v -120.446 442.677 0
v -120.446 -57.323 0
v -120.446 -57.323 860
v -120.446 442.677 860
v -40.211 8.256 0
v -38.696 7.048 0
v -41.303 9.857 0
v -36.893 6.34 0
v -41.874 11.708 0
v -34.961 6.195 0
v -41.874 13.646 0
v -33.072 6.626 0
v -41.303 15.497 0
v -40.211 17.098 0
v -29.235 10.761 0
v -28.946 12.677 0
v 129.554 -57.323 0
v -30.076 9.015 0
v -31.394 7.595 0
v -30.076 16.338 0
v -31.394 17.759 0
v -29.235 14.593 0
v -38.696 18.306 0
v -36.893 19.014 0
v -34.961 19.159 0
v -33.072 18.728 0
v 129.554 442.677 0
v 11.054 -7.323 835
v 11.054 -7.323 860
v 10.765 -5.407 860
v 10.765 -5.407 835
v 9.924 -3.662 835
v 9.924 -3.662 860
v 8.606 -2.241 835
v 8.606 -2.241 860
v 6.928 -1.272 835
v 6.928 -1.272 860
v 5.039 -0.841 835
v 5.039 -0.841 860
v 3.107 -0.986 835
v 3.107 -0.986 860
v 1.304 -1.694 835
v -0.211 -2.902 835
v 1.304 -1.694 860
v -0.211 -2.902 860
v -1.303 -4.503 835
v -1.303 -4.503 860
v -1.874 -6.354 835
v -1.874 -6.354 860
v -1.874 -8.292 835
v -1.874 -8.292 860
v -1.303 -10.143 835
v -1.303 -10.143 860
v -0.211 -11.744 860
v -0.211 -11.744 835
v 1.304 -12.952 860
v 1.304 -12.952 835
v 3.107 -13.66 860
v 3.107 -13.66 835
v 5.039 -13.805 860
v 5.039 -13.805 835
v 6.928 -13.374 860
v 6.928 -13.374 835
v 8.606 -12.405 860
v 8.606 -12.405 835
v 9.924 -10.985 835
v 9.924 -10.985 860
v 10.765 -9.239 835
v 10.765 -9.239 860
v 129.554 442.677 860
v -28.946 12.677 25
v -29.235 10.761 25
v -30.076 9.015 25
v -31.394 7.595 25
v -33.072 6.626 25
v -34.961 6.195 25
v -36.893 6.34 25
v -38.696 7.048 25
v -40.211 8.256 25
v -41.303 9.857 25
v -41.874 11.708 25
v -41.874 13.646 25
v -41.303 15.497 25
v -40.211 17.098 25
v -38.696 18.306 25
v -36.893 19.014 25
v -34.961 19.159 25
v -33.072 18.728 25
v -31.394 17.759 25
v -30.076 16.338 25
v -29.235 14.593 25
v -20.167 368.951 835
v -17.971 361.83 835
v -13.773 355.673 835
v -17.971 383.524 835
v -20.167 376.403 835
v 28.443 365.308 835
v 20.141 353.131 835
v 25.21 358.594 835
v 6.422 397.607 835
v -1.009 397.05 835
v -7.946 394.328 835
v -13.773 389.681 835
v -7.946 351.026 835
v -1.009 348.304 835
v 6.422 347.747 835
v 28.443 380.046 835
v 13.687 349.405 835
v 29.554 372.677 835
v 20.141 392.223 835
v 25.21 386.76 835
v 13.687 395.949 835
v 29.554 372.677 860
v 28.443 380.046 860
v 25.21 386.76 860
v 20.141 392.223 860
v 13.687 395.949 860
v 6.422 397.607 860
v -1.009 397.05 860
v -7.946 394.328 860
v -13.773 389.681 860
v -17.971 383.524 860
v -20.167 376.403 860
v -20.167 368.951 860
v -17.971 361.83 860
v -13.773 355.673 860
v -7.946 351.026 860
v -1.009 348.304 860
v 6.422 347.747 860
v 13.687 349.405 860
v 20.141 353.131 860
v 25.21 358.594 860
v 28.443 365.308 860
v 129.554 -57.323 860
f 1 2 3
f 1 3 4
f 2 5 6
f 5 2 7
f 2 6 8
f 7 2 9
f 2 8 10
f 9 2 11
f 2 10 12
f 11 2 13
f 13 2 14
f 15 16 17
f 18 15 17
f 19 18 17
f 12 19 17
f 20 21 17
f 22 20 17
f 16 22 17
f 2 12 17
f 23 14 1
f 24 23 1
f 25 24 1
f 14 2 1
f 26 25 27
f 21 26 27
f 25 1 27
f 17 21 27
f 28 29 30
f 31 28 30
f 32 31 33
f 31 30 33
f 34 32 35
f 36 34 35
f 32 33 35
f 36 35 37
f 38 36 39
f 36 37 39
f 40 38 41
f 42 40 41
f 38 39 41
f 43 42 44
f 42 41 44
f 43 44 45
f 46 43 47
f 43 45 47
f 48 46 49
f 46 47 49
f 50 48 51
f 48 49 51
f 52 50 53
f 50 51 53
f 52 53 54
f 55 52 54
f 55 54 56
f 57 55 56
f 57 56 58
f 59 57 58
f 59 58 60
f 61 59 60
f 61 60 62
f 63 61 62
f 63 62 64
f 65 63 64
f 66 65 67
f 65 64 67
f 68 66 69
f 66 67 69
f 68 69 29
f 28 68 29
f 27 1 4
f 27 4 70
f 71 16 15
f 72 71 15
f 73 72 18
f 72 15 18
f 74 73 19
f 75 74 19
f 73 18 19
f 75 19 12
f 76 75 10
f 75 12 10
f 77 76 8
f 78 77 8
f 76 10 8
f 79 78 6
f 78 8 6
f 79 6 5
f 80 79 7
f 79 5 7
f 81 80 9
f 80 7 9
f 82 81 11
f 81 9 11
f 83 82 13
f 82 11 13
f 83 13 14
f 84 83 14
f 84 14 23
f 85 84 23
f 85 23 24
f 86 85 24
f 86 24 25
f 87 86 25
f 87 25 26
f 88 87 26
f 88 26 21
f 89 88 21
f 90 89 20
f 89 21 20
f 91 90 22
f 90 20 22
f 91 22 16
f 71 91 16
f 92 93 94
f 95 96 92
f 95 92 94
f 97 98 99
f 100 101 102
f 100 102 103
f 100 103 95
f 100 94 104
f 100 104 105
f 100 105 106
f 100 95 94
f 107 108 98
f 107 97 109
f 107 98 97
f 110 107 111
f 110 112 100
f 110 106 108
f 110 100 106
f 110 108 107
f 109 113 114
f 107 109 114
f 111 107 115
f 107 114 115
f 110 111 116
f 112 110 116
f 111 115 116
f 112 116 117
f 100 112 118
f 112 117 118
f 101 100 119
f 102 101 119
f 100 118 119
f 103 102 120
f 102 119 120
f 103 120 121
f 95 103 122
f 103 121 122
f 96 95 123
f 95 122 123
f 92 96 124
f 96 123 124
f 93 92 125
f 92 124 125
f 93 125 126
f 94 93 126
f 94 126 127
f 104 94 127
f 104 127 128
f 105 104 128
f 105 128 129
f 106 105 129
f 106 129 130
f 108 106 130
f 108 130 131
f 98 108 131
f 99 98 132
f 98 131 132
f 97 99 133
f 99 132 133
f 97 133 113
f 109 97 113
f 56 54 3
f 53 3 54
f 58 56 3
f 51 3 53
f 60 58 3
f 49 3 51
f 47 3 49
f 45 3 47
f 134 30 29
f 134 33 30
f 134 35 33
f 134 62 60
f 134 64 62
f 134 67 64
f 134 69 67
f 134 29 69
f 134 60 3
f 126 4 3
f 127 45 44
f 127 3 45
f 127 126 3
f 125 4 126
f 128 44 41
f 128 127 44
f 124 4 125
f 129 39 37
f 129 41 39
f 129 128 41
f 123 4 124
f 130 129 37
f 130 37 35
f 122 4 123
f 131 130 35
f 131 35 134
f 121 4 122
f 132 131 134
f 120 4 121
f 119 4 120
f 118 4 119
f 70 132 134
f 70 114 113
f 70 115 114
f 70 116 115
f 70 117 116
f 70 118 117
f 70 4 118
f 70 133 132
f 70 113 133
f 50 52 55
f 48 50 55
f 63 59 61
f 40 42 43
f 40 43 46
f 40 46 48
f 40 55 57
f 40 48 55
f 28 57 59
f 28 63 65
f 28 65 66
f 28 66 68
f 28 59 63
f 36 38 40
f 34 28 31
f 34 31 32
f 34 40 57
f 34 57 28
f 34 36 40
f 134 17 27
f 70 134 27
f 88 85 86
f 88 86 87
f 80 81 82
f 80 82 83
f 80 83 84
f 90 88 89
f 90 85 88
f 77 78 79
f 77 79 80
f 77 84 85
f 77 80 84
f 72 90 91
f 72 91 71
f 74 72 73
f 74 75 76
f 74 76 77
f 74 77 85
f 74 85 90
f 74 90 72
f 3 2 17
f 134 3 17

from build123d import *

# Parameters (mm, degrees)
F0_W     = 250
F0_H     = 500
F1_DEPTH = 860
F2_R     = 25
F2_R_2   = 6.5
F3_DEPTH = 25
F4_R     = 6.5
F5_DEPTH = 25


with BuildPart() as f1:
    # F0 (on Top) → F1 (new body)
    with BuildSketch(Plane.XY):
        with Locations((4.553568, 192.676917)):
            Rectangle(F0_W, F0_H)
    extrude(amount=F1_DEPTH)

    # F2 (on face) → F3 (cut)
    with BuildSketch(Plane.XY.offset(860)):
        with Locations((4.553568, 372.676917)):
            Circle(F2_R)
        with Locations((4.553568, -7.323083)):
            Circle(F2_R_2)
    extrude(amount=-F3_DEPTH, mode=Mode.SUBTRACT)

    # F4 (on face) → F5 (cut)
    with BuildSketch(Plane(origin=(0, 0, 0), x_dir=(1, 0, 0), z_dir=(0, 0, -1))):
        with Locations((-35.446432, -12.676917)):
            Circle(F4_R)
    extrude(amount=-F5_DEPTH, mode=Mode.SUBTRACT)


solid = f1.part
